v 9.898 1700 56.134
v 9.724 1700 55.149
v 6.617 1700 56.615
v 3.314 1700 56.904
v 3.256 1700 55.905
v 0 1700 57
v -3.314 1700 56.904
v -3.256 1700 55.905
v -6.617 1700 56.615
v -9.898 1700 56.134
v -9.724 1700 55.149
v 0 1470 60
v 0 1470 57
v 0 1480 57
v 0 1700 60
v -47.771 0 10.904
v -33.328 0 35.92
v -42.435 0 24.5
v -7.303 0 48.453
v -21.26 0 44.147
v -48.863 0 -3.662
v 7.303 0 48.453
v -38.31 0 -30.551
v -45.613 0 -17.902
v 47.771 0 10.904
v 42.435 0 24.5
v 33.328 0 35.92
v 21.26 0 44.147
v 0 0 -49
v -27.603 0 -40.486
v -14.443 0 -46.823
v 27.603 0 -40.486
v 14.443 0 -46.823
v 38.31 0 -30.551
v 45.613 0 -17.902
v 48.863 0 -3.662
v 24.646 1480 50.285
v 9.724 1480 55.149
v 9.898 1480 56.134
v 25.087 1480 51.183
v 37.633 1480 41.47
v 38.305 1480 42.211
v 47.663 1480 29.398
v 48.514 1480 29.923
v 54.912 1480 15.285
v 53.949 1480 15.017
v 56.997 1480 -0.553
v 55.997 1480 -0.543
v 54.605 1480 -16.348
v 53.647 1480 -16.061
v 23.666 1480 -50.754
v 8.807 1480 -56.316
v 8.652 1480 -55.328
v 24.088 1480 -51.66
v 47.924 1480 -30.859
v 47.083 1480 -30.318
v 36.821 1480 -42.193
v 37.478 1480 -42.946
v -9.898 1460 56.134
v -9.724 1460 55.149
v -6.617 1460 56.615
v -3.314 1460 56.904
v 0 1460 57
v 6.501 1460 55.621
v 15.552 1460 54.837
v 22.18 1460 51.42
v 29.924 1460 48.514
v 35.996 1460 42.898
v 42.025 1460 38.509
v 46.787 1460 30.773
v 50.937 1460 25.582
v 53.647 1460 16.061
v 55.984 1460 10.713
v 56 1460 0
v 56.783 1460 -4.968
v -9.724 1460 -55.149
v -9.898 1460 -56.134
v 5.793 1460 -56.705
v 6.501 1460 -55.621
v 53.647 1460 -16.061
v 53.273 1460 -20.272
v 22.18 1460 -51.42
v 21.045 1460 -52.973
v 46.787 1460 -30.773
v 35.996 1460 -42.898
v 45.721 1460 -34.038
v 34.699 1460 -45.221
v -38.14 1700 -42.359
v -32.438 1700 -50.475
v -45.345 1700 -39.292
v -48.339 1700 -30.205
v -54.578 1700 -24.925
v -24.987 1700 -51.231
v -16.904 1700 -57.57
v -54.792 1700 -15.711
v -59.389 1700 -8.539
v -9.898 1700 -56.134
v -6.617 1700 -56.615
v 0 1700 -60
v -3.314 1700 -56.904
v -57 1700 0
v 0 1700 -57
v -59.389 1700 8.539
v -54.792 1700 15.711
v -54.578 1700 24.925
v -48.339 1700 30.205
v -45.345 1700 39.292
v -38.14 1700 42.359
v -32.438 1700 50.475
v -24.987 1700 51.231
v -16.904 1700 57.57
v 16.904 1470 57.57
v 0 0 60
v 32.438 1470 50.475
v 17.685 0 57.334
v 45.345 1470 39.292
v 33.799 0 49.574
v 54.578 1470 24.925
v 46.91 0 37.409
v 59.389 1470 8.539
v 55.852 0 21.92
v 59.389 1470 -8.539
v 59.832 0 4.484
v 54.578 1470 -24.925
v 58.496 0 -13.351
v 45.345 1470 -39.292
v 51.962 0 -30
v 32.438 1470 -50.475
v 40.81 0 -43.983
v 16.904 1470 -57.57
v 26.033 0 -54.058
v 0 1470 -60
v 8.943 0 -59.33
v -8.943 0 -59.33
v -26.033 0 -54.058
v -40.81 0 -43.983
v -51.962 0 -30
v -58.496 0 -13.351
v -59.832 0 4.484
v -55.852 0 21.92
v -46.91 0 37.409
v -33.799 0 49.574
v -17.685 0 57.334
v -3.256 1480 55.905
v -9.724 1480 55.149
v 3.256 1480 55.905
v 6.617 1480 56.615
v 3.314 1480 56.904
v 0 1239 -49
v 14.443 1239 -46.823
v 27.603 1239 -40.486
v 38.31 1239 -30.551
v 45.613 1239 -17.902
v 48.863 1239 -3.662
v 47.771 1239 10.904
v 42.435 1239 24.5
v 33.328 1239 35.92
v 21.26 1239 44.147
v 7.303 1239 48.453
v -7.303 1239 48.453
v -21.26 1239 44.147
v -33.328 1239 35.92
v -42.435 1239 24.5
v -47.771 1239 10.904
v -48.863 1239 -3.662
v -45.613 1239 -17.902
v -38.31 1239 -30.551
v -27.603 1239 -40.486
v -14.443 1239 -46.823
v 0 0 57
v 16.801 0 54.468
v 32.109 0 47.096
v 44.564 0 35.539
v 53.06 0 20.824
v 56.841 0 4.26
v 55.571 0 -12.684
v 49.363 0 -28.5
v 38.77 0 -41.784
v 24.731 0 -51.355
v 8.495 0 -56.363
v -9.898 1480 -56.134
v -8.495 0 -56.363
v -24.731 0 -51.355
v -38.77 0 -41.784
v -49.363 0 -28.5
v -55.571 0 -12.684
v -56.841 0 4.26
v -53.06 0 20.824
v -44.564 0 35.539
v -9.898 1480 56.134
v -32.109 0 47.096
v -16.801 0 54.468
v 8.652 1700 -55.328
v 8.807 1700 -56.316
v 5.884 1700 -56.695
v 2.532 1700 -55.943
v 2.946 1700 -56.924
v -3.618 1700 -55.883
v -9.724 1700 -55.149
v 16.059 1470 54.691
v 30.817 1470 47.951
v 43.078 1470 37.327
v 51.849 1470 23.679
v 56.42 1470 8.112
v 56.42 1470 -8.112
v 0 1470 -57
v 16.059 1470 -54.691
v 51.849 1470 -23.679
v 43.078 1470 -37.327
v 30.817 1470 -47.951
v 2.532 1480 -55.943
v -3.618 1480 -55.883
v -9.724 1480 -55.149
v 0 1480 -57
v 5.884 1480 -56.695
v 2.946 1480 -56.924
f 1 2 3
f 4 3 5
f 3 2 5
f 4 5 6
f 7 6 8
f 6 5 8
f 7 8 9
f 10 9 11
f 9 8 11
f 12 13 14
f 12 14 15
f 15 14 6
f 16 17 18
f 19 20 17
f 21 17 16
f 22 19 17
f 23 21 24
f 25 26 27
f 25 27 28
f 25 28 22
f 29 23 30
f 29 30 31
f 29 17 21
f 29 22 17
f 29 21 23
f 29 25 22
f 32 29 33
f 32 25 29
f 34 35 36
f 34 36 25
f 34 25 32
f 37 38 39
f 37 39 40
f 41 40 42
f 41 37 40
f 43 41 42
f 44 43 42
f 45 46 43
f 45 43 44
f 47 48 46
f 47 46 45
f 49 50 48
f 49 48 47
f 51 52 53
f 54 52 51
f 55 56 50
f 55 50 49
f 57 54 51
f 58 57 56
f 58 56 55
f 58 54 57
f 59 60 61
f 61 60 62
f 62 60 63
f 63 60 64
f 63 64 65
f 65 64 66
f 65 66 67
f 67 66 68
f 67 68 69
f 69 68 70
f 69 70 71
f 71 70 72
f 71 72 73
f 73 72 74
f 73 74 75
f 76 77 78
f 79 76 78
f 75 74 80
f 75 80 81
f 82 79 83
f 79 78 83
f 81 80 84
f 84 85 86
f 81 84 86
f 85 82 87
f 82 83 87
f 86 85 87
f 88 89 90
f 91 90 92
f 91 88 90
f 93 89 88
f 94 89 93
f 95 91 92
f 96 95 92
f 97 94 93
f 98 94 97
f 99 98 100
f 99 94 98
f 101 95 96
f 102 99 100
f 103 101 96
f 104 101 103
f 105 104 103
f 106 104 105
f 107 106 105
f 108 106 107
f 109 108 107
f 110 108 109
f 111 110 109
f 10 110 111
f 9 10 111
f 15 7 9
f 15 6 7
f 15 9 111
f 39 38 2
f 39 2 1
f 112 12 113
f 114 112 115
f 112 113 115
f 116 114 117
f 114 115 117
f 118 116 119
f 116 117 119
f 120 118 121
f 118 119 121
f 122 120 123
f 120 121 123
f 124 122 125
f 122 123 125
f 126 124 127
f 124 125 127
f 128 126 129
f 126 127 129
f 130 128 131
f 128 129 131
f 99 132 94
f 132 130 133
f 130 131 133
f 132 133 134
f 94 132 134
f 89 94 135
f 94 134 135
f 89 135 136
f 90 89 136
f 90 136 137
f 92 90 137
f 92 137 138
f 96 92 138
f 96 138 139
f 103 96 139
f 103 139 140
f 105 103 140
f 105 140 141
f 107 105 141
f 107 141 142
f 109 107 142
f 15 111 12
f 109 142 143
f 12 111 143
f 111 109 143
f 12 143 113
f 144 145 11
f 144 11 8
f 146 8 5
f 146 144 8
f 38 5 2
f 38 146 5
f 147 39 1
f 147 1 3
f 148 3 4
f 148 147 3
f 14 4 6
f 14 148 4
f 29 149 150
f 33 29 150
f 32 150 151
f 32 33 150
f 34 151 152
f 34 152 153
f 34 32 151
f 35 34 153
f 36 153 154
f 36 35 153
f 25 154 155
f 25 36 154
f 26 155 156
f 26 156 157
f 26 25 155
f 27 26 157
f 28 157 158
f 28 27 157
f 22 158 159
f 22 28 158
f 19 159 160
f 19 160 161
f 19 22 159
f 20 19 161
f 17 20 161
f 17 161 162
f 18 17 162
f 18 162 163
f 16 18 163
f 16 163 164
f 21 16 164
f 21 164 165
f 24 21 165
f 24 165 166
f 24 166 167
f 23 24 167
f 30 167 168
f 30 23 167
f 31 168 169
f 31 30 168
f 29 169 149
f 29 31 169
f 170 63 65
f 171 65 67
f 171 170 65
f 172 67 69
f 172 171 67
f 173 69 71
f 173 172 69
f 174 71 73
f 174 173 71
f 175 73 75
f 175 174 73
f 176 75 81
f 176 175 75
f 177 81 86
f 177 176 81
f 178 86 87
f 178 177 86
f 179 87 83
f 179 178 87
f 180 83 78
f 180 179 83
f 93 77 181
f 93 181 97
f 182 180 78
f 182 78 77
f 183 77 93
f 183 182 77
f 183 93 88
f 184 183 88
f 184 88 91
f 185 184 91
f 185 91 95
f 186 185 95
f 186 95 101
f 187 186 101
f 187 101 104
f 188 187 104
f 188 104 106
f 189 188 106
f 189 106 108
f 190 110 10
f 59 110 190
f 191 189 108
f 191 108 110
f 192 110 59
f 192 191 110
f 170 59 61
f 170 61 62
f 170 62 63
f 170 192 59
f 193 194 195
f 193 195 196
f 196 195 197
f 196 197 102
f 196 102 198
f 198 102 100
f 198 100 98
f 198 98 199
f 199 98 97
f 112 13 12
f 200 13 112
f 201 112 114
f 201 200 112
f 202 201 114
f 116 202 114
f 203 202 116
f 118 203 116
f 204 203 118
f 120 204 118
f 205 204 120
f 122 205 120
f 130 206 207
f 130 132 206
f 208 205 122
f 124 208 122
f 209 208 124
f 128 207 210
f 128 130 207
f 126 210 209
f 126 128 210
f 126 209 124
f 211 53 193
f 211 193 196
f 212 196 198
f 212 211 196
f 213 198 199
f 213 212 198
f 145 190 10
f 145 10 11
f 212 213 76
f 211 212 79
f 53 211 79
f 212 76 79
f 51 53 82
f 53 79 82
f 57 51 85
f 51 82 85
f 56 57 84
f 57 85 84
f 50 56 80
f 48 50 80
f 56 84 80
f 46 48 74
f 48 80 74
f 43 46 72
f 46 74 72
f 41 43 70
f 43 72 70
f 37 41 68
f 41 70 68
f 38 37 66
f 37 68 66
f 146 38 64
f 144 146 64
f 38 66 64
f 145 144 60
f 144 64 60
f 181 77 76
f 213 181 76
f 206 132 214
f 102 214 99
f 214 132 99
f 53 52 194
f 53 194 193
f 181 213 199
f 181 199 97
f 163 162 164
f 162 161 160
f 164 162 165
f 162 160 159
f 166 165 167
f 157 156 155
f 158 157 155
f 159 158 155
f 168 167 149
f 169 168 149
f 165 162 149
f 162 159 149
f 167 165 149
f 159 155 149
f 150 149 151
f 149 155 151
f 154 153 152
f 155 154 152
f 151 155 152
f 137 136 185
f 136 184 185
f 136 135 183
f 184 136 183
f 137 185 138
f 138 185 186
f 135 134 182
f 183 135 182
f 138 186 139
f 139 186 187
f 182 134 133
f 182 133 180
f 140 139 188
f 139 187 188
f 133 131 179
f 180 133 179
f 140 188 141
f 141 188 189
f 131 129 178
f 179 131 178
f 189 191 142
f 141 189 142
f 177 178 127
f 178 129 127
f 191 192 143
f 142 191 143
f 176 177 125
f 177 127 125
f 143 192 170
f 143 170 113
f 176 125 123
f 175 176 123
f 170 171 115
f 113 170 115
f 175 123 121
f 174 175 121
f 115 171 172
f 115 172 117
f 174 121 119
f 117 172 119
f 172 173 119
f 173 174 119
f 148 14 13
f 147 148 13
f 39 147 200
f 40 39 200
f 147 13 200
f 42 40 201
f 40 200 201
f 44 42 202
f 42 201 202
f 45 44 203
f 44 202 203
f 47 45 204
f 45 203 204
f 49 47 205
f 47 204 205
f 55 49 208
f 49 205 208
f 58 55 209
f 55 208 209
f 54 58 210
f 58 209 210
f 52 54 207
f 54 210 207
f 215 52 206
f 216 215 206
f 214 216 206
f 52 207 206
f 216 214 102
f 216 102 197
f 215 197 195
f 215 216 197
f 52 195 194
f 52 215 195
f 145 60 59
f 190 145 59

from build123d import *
from build123d.topology import SkipClean

# Parameters (mm, degrees)
SKETCH1_R                = 60
SKETCH1_R_2              = 57
BOSS_EXTRUDE1_DEPTH      = 1700
SKETCH4_R                = 49
BOSS_EXTRUDE2_DEPTH      = 1239
CUT_EXTRUDE1_DEPTH       = 1239
CUT_EXTRUDE1_DEPTH_BACK  = 1239
SKETCH7_W                = 139.911770255
SKETCH7_H                = 230
BOSS_EXTRUDE5_DEPTH      = 10
BOSS_EXTRUDE5_DEPTH_BACK = 10
BOSS_EXTRUDE6_DEPTH      = 220


with BuildPart() as part:
    # Sketch1 → Boss-Extrude1 (new body)
    with BuildSketch(Plane(origin=(0, 0, 0), x_dir=(1, 0, 0), z_dir=(0, 1, 0))):
        Circle(SKETCH1_R)
        Circle(SKETCH1_R_2, mode=Mode.SUBTRACT)
    extrude(amount=BOSS_EXTRUDE1_DEPTH)

    # Sketch7 → Cut-Extrude1 (cut, two sides: drawn at the far end of the back side and taken through both)
    with BuildSketch(Plane.XY.offset(-CUT_EXTRUDE1_DEPTH_BACK)):
        with Locations((69.955885128, 1585)):
            Rectangle(SKETCH7_W, SKETCH7_H)
    extrude(amount=CUT_EXTRUDE1_DEPTH + CUT_EXTRUDE1_DEPTH_BACK, mode=Mode.SUBTRACT)

    # Sketch8 → Boss-Extrude5 (add, two sides: drawn at the far end of the back side and taken through both)
    with BuildSketch(Plane(origin=(0, 1470, 0), x_dir=(1, 0, 0), z_dir=(0, 1, 0)).offset(-BOSS_EXTRUDE5_DEPTH_BACK)):
        with BuildLine():
            Line((-9.724297949, -55.149234169), (-9.897946127, -56.134041922))
            ThreePointArc((-9.897946127, -56.134041922), (57, 0), (-9.897946127, 56.134041922))
            Line((-9.897946127, 56.134041922), (-9.724297949, 55.149234169))
            ThreePointArc((-9.724297949, 55.149234169), (56, 0), (-9.724297949, -55.149234169))
        make_face()
    extrude(amount=BOSS_EXTRUDE5_DEPTH + BOSS_EXTRUDE5_DEPTH_BACK)

    # Sketch9 → Boss-Extrude6 (add)
    with SkipClean():  # the faces are left unmerged after this step: merging them gives an invalid solid
        with BuildSketch(Plane(origin=(0, 1480, 0), x_dir=(1, 0, 0), z_dir=(0, 1, 0))):
            with BuildLine():
                Line((-9.897946127, -56.134041922), (-9.724297949, -55.149234169))
                ThreePointArc((-9.724297949, -55.149234169), (0, -56), (9.724297949, -55.149234169))
                Line((9.724297949, -55.149234169), (9.897946127, -56.134041922))
                ThreePointArc((9.897946127, -56.134041922), (0, -57), (-9.897946127, -56.134041922))
            make_face()
            with BuildLine():
                Line((8.806670499, 56.315562278), (8.652167507, 55.327569958))
                ThreePointArc((8.652167507, 55.327569958), (-0.543430616, 55.99736318), (-9.724297949, 55.149234169))
                Line((-9.724297949, 55.149234169), (-9.897946127, 56.134041922))
                ThreePointArc((-9.897946127, 56.134041922), (-0.553134734, 56.997316094), (8.806670499, 56.315562278))
            make_face()
        extrude(amount=BOSS_EXTRUDE6_DEPTH)


with BuildPart() as body_2:
    # Sketch4 → Boss-Extrude2 (new body)
    with BuildSketch(Plane.XZ):
        Circle(SKETCH4_R)
    extrude(amount=-BOSS_EXTRUDE2_DEPTH)


solid = Compound([part.part, body_2.part])
